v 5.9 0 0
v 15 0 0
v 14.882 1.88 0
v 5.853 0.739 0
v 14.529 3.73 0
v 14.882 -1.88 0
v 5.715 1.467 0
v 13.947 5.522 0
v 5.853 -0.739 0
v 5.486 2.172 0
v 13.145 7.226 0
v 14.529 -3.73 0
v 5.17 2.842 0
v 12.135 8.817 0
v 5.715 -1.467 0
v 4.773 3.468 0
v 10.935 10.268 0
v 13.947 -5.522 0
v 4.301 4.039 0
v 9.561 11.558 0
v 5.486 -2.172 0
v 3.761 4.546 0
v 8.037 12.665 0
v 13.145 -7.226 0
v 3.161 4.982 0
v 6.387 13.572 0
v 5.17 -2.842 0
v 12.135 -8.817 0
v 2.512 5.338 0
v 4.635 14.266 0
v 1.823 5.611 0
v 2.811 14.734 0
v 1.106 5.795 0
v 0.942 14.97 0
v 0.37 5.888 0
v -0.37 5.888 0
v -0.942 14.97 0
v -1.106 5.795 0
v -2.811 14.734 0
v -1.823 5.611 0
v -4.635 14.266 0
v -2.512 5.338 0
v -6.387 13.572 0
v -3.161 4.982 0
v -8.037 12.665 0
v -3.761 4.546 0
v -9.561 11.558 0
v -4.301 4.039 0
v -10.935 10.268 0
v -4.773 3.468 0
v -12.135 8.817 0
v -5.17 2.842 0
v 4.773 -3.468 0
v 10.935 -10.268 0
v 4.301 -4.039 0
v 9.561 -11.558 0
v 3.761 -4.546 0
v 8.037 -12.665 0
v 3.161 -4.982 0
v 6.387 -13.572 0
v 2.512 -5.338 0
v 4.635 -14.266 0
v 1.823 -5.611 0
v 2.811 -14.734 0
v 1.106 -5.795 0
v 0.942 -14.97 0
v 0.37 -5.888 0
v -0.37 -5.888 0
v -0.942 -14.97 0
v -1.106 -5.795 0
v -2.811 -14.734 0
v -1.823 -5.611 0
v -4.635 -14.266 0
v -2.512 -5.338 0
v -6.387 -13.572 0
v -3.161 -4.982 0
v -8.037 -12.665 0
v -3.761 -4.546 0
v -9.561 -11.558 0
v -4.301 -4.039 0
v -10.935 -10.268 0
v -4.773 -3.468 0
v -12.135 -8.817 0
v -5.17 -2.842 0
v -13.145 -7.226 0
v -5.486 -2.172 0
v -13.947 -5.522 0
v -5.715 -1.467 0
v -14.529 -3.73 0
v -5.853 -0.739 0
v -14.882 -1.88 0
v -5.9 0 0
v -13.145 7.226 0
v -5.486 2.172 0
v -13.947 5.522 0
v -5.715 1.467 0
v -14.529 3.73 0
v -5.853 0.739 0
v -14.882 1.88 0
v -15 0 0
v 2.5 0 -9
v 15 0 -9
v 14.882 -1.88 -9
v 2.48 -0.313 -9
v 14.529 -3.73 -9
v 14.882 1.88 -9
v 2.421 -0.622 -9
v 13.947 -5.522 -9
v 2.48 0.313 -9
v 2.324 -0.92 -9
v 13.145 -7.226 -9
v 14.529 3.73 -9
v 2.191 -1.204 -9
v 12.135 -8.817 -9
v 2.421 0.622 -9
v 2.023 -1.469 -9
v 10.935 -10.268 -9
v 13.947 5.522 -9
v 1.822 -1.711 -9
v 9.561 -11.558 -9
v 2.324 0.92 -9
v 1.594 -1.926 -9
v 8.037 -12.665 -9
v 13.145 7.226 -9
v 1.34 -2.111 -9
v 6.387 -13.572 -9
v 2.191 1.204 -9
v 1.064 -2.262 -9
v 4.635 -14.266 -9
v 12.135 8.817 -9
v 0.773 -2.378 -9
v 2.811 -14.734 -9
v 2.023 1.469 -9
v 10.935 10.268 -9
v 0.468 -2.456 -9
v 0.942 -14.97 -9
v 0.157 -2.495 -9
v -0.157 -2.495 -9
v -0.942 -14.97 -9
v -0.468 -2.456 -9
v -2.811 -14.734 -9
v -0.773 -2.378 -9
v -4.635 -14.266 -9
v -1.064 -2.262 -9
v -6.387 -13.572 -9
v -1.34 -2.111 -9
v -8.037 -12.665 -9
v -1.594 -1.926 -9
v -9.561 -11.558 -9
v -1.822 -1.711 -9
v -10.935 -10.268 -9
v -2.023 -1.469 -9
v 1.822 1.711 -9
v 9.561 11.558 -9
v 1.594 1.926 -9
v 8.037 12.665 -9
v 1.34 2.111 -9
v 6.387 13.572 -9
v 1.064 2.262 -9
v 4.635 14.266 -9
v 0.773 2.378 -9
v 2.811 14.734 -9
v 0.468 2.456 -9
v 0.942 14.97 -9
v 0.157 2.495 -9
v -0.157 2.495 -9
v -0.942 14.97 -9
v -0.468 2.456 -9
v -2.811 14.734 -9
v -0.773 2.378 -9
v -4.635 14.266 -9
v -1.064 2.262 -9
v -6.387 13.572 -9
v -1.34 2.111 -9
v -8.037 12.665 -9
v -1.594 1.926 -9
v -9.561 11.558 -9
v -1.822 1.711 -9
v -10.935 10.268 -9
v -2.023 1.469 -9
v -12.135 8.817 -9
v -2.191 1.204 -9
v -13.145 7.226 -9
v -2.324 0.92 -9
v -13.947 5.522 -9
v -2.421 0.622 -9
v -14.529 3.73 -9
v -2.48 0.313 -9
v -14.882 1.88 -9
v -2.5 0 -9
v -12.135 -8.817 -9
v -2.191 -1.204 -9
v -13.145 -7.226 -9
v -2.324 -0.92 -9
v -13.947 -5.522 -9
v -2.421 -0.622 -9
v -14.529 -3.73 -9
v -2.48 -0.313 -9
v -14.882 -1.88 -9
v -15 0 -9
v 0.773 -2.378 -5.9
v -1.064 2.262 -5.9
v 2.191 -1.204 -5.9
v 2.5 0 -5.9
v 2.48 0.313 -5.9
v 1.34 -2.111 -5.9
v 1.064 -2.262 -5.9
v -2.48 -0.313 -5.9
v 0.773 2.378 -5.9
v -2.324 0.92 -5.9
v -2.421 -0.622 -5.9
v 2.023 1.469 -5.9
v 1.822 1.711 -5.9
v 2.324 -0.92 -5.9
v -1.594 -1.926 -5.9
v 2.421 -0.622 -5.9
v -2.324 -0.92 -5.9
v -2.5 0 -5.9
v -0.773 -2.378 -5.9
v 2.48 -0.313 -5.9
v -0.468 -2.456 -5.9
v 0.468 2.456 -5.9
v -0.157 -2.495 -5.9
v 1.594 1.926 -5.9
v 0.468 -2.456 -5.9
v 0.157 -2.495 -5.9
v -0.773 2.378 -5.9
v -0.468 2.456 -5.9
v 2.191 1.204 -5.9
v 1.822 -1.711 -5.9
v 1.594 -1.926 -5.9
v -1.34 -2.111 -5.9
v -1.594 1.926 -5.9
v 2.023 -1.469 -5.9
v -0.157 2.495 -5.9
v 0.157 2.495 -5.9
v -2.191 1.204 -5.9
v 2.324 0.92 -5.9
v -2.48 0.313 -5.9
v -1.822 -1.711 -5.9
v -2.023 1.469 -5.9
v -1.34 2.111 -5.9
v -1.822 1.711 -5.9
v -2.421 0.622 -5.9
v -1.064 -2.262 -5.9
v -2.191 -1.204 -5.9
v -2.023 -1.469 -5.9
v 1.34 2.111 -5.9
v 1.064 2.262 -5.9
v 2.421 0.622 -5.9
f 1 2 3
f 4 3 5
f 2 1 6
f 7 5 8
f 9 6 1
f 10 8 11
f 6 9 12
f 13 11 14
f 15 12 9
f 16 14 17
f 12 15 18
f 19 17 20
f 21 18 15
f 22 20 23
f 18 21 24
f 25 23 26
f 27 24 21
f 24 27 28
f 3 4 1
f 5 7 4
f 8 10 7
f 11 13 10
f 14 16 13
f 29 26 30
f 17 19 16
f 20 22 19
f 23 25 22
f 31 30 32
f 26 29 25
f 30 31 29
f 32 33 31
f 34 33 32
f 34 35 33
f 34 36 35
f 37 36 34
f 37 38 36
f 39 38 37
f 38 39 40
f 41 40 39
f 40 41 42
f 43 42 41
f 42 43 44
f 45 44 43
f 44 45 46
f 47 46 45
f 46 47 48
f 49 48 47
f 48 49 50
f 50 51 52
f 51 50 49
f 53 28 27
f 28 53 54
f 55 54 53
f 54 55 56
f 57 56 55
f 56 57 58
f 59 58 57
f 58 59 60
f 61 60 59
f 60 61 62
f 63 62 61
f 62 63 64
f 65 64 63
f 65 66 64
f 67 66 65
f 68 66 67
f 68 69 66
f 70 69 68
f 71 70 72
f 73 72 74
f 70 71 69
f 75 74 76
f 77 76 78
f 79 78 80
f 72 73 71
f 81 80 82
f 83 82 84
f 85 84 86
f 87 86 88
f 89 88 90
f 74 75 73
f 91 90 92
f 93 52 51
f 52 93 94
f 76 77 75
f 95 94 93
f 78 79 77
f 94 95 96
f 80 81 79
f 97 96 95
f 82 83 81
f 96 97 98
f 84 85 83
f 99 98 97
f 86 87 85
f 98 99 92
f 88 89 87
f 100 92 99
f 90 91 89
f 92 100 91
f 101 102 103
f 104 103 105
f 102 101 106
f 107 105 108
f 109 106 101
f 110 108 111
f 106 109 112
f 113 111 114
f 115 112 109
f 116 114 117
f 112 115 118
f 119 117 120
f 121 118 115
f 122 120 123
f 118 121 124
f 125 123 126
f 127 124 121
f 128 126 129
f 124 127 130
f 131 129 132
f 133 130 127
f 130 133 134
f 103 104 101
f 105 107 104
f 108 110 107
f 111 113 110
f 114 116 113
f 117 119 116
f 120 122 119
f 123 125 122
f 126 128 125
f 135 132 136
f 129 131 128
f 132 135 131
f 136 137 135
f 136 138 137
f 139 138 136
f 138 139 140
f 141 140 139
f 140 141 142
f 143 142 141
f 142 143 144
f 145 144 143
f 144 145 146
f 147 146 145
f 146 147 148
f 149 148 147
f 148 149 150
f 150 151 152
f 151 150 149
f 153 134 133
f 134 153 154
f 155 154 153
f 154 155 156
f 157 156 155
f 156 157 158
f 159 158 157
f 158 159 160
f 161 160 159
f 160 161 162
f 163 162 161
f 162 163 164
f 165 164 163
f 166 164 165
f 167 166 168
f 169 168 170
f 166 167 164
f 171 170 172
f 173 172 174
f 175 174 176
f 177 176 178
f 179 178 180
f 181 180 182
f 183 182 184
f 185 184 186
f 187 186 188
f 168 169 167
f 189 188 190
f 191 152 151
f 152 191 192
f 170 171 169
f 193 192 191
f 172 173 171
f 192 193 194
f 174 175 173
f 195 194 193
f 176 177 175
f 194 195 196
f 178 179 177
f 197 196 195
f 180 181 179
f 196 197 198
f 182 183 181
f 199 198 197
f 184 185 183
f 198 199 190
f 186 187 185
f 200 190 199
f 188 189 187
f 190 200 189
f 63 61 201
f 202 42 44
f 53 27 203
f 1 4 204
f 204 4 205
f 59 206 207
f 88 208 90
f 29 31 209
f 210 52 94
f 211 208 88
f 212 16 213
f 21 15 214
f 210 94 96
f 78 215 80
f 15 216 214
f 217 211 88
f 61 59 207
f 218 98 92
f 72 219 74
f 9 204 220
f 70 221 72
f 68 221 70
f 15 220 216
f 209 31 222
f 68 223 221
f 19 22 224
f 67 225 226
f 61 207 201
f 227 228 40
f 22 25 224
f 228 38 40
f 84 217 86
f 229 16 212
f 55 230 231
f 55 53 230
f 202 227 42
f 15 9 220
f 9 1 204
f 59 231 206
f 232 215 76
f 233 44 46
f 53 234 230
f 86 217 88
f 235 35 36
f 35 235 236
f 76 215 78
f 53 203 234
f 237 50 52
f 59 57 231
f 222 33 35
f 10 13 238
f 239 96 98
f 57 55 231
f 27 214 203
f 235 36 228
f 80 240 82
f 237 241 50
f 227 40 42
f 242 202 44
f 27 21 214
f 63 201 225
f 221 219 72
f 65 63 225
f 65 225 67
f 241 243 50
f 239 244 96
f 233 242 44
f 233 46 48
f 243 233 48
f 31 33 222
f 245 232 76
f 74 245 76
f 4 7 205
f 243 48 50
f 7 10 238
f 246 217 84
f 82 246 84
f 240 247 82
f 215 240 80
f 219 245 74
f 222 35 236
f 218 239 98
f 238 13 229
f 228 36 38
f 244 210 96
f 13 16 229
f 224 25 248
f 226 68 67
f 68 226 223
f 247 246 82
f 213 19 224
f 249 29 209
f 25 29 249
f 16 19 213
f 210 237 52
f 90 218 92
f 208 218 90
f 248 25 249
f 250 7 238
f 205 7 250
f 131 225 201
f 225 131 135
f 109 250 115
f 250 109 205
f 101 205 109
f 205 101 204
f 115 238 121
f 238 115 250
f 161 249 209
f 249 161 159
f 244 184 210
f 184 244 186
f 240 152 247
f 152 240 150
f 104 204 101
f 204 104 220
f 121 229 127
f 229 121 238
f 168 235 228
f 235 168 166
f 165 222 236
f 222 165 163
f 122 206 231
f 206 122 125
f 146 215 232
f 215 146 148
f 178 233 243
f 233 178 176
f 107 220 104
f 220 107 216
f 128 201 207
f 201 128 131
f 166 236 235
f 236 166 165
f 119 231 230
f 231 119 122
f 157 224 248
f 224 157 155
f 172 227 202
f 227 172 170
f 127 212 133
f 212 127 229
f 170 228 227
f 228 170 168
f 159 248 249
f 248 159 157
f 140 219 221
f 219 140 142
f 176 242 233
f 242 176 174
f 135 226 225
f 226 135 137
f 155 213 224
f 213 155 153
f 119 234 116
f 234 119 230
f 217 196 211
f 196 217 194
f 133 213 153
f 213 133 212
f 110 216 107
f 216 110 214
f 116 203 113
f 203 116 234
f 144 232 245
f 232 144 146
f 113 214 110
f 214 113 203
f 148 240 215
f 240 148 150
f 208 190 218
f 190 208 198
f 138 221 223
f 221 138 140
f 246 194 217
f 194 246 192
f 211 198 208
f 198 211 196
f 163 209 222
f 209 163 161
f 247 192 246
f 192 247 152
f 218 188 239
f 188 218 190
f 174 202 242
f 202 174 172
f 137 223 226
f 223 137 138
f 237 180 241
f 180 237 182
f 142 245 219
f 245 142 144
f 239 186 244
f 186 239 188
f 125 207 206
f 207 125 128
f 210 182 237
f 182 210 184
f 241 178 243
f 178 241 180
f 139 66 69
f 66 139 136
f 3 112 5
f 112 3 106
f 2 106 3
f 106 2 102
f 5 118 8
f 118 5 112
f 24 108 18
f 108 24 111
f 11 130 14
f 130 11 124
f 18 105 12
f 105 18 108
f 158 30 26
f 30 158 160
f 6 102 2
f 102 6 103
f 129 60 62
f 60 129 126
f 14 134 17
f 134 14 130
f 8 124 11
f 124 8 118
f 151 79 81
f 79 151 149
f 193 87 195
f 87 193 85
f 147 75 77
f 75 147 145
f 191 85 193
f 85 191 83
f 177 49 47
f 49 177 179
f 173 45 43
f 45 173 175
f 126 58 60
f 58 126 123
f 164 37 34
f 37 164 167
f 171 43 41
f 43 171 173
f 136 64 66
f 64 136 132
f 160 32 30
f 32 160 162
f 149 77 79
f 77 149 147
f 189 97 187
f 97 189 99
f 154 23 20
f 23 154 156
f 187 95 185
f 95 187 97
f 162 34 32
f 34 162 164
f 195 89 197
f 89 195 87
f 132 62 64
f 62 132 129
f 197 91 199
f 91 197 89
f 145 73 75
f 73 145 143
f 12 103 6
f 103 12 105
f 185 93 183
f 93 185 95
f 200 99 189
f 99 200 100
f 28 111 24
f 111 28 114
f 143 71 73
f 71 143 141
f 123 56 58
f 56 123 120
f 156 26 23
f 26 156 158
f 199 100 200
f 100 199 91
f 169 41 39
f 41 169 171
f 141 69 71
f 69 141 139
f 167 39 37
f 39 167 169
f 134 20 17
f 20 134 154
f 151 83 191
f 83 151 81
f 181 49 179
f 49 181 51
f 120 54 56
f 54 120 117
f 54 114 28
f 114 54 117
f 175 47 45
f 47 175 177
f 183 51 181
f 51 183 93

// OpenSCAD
$fn = 50;


difference() {
	union() {
		translate(v = [0, 0, -9.0000000000]) {
			cylinder(h = 9, r = 15.0000000000);
		}
	}
	union() {
		translate(v = [0, 0, 0]) {
			rotate(a = [0, 0, 0]) {
				difference() {
					union() {
						#translate(v = [0, 0, -9.0000000000]) {
							cylinder(h = 9, r = 2.2500000000);
						}
						#translate(v = [0, 0, -5.9000000000]) {
							cylinder(h = 5.9000000000, r1 = 2.5000000000, r2 = 5.9000000000);
						}
						#translate(v = [0, 0, -9.0000000000]) {
							cylinder(h = 9, r = 2.5000000000);
						}
						#translate(v = [0, 0, -9.0000000000]) {
							cylinder(h = 9, r = 2.2500000000);
						}
					}
					union();
				}
			}
		}
	}
}
